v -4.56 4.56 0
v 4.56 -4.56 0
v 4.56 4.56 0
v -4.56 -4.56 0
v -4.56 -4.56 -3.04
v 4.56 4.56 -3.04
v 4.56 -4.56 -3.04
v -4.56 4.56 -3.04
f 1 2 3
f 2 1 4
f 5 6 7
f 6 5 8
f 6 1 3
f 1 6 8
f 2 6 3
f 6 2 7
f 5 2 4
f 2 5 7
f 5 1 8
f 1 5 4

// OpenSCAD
// file: ../p/box.scad
use <../lib.scad>
function ldraw_lib__box() = [
// 0 Box 6 (six faces)
// 0 Name: box.dat
// 0 Author: James Jessiman
// 0 !LDRAW_ORG Primitive UPDATE 2002-05
// 0 !LICENSE Licensed under CC BY 2.0 and CC BY 4.0 : see CAreadme.txt
// 
// 0 BFC CERTIFY CCW
  [0,"BFC","CERTIFY"],
  [0,"BFC","CCW"],
// 
// 0 !HISTORY 2002-08-22 [sbliss] Applied BFC
// 0 !HISTORY 2002-11-30 [PTadmin] Official Update 2002-05
// 0 !HISTORY 2007-06-24 [PTadmin] Header formatted for Contributor Agreement
// 0 !HISTORY 2008-07-01 [PTadmin] Official Update 2008-01
// 
// 
// 2 24 1 1 1 -1 1 1
  [2,24,1,1,1,-1,1,1],
// 2 24 -1 1 1 -1 1 -1
  [2,24,-1,1,1,-1,1,-1],
// 2 24 -1 1 -1 1 1 -1
  [2,24,-1,1,-1,1,1,-1],
// 2 24 1 1 -1 1 1 1
  [2,24,1,1,-1,1,1,1],
// 2 24 1 -1 1 -1 -1 1
  [2,24,1,-1,1,-1,-1,1],
// 2 24 -1 -1 1 -1 -1 -1
  [2,24,-1,-1,1,-1,-1,-1],
// 2 24 -1 -1 -1 1 -1 -1
  [2,24,-1,-1,-1,1,-1,-1],
// 2 24 1 -1 -1 1 -1 1
  [2,24,1,-1,-1,1,-1,1],
// 2 24 1 -1 1 1 1 1
  [2,24,1,-1,1,1,1,1],
// 2 24 -1 -1 1 -1 1 1
  [2,24,-1,-1,1,-1,1,1],
// 2 24 1 -1 -1 1 1 -1
  [2,24,1,-1,-1,1,1,-1],
// 2 24 -1 -1 -1 -1 1 -1
  [2,24,-1,-1,-1,-1,1,-1],
// 4 16 1 1 1 1 1 -1 -1 1 -1 -1 1 1
  [4,16,1,1,1,1,1,-1,-1,1,-1,-1,1,1],
// 4 16 -1 -1 -1 1 -1 -1 1 -1 1 -1 -1 1
  [4,16,-1,-1,-1,1,-1,-1,1,-1,1,-1,-1,1],
// 4 16 -1 -1 1 1 -1 1 1 1 1 -1 1 1
  [4,16,-1,-1,1,1,-1,1,1,1,1,-1,1,1],
// 4 16 -1 -1 -1 -1 -1 1 -1 1 1 -1 1 -1
  [4,16,-1,-1,-1,-1,-1,1,-1,1,1,-1,1,-1],
// 4 16 1 -1 -1 -1 -1 -1 -1 1 -1 1 1 -1
  [4,16,1,-1,-1,-1,-1,-1,-1,1,-1,1,1,-1],
// 4 16 1 -1 1 1 -1 -1 1 1 -1 1 1 1
  [4,16,1,-1,1,1,-1,-1,1,1,-1,1,1,1],
// 0
];
module ldraw_lib__box(step=0, col=false, unit=2/5, alt=false, line=0.2, solid=!$preview)
    makepoly(ldraw_lib__box(), step=step, col=col, unit=unit, alt=alt, line=line, solid=solid);
ldraw_lib__box(line=0.2);
// main file
use <../lib.scad>
use <../p/box.scad>
function ldraw_lib__70591() = [
// 0 ~Technic Control Centre - Rubber Foot
// 0 Name: 70591.dat
// 0 Author: Steffen [Steffen]
// 0 !LDRAW_ORG Part UPDATE 2019-02
// 0 !LICENSE Licensed under CC BY 2.0 and CC BY 4.0 : see CAreadme.txt
// 
// 0 BFC CERTIFY CW
  [0,"BFC","CERTIFY"],
  [0,"BFC","CW"],
// 
// 0 !CATEGORY Electric
// 
// 0 !CMDLINE -c511
// 
// 0 !HISTORY 2012-03-30 [PTadmin] Official Update 2012-01
// 0 !HISTORY 2018-10-27 [PTadmin] Renamed from u9227
// 0 !HISTORY 2019-09-09 [PTadmin] Official Update 2019-02
// 
// 
// 1 16 0 3.8 0 -11.4 0 0 0 -3.8 0 0 0 11.4 box.dat
  [1,16,0,3.8,0,-11.4,0,0,0,-3.8,0,0,0,11.4, ldraw_lib__box()],
];
module ldraw_lib__70591(step=0, col=false, unit=2/5, alt=false, line=0.2, solid=!$preview)
    makepoly(ldraw_lib__70591(), step=step, col=col, unit=unit, alt=alt, line=line, solid=solid);
ldraw_lib__70591(line=0.2);
